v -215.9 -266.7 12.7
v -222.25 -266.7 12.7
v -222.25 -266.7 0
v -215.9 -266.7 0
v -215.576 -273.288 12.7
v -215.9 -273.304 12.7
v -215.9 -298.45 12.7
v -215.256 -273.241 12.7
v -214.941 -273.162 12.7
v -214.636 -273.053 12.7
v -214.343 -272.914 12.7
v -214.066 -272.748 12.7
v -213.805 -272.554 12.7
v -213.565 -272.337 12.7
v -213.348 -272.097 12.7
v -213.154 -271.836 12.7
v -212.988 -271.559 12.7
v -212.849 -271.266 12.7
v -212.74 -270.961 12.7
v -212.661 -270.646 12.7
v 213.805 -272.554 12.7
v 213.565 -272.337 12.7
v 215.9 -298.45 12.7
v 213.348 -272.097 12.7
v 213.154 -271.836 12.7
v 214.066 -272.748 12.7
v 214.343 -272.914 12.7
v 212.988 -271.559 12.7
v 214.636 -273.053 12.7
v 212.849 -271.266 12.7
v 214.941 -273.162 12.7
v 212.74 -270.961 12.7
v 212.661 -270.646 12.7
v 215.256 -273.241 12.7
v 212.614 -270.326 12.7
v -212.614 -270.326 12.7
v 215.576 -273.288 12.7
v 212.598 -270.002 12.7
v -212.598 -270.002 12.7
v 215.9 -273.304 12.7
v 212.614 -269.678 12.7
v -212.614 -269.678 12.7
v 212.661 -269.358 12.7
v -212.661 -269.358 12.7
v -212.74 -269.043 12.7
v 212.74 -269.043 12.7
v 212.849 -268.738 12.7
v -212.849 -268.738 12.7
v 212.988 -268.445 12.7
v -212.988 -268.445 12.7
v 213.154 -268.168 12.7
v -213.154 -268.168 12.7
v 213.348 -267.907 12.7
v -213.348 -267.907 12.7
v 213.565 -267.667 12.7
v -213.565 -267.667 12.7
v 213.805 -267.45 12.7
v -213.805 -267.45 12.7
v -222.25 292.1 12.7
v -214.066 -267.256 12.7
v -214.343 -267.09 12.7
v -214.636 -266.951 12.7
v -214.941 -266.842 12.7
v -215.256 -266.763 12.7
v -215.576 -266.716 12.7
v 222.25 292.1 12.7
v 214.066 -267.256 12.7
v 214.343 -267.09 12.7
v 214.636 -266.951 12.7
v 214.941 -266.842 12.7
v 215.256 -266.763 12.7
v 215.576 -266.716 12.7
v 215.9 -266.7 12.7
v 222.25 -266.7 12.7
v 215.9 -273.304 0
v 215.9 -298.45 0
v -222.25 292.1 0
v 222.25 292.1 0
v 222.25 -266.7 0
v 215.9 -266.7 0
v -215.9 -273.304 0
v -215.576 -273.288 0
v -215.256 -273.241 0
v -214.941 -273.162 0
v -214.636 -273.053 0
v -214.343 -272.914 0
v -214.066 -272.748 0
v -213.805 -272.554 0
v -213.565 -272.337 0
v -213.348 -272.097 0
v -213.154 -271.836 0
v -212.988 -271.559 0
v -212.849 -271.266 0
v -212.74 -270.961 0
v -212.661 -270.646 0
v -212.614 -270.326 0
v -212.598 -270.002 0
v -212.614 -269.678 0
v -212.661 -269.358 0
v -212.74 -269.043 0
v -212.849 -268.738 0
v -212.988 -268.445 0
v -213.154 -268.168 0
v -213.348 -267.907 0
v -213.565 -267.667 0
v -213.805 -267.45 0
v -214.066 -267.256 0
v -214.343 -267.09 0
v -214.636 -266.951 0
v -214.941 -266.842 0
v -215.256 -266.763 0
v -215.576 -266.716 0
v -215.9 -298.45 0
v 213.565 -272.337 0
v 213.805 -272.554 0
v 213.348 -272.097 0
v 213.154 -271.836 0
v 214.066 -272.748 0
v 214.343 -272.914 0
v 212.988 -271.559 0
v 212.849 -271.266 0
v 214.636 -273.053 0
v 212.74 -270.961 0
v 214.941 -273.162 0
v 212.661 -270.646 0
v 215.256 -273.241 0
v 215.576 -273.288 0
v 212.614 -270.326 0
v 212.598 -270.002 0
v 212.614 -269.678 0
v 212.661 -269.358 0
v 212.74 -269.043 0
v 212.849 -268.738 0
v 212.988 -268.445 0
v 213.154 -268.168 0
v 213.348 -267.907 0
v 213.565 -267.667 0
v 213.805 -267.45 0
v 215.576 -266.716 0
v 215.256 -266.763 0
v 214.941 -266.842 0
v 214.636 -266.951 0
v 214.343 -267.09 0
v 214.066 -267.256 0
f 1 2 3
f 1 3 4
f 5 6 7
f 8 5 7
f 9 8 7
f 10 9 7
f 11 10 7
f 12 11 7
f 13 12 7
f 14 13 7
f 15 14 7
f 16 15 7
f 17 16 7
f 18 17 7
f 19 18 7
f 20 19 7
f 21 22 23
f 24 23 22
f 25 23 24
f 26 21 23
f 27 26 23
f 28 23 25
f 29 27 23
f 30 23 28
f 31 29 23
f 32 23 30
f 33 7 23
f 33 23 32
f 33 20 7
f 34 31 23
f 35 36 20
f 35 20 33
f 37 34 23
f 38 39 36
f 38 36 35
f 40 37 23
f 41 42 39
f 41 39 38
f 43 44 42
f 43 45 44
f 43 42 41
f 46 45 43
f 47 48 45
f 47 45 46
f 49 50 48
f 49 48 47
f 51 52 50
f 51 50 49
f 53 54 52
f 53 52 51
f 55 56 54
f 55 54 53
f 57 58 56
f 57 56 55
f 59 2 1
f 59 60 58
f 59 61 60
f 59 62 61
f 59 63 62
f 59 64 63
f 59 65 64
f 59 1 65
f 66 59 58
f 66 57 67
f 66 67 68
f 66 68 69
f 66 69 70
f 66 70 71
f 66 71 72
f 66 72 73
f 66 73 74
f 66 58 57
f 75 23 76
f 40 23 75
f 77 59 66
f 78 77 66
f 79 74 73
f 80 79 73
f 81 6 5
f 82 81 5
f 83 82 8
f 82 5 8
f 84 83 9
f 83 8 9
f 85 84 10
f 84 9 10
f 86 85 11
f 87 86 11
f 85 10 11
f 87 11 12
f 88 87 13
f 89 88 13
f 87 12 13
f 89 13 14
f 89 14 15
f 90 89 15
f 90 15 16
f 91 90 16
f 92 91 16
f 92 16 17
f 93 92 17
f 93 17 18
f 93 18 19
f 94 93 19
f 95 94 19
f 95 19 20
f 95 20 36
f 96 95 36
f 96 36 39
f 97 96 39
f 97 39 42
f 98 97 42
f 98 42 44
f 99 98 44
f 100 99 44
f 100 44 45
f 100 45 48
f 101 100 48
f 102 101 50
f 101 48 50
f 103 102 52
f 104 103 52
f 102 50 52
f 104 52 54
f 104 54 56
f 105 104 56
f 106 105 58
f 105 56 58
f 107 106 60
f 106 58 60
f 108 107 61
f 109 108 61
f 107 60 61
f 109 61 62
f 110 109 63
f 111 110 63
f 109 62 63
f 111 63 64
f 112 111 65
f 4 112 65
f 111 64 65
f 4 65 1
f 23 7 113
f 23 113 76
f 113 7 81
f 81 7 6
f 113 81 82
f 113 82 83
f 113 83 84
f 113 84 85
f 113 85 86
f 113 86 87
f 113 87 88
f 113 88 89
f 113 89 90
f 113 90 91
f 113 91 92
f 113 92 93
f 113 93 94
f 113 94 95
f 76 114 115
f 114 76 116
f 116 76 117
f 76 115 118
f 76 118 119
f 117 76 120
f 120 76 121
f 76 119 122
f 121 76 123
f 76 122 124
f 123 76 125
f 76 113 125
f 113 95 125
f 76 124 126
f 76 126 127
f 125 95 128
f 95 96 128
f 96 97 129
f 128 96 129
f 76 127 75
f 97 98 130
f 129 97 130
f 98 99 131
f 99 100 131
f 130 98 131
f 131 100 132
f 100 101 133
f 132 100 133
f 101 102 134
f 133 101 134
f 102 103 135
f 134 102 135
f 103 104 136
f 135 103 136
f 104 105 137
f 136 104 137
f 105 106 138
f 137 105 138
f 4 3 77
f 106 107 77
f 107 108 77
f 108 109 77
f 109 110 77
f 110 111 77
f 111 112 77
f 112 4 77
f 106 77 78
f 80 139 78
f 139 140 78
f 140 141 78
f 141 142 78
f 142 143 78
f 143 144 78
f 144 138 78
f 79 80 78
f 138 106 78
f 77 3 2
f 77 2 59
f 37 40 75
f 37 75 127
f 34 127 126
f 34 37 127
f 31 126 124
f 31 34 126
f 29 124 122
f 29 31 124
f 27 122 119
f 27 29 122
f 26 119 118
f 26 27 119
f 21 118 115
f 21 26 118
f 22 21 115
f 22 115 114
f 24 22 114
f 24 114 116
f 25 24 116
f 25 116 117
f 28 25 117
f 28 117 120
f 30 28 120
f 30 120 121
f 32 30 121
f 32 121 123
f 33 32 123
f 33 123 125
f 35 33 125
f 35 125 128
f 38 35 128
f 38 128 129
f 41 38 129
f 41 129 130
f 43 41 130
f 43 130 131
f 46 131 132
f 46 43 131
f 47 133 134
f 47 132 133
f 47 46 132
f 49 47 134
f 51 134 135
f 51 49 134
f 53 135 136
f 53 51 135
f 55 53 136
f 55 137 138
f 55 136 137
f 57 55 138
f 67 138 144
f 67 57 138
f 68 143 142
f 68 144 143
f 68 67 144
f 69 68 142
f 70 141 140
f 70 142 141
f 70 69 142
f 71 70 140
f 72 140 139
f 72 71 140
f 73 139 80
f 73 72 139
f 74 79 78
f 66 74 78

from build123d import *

# Parameters (mm, degrees)
SKETCH1_W           = 444.5
SKETCH1_H           = 609.6
BOSS_EXTRUDE1_DEPTH = 12.7
CUT_EXTRUDE1_DEPTH  = 378.437931984
LPATTERN1_COUNT     = 8
LPATTERN1_PITCH     = 50.8
SKETCH3_R           = 3.302
SKETCH3_W           = 6.35
SKETCH3_H           = 38.1
CUT_EXTRUDE2_DEPTH  = 378.437931984
SKETCH4_W           = 444.5
SKETCH4_H           = 12.7
CUT_EXTRUDE3_DEPTH  = 378.437931984
SKETCH5_W           = 444.5
SKETCH5_H           = 18.431928634
BOSS_EXTRUDE2_DEPTH = 12.7
SKETCH7_W           = 444.5
SKETCH7_H           = 12.7
CUT_EXTRUDE5_DEPTH  = 6.35


with BuildPart() as part:
    # Sketch1 → Boss-Extrude1 (new body)
    with BuildSketch(Plane.XY):
        Rectangle(SKETCH1_W, SKETCH1_H)
    extrude(amount=BOSS_EXTRUDE1_DEPTH)

    # Sketch2 → Cut-Extrude1 (cut, through all)
    with BuildSketch(Plane.XY.offset(12.7)):
        with BuildLine():
            Line((-165.1, 304.8), (-190.5, 304.8))
            Line((-190.5, 304.8), (-190.5, 292.1))
            ThreePointArc((-190.5, 292.1), (-187.198, 295.402), (-183.896, 292.1))
            Line((-183.896, 292.1), (-171.704, 292.1))
            ThreePointArc((-171.704, 292.1), (-168.402, 295.402), (-165.1, 292.1))
            Line((-165.1, 292.1), (-165.1, 304.8))
        make_face()
        with BuildLine():
            ThreePointArc((-183.896, 292.1), (-187.198, 295.402), (-190.5, 292.1))
            Line((-190.5, 292.1), (-183.896, 292.1))
        make_face()
        with BuildLine():
            Line((-183.896, 292.1), (-190.5, 292.1))
            ThreePointArc((-190.5, 292.1), (-187.198, 288.798), (-183.896, 292.1))
        make_face()
        with BuildLine():
            ThreePointArc((-171.704, 292.1), (-168.402, 288.798), (-165.1, 292.1))
            Line((-165.1, 292.1), (-171.704, 292.1))
        make_face()
        with BuildLine():
            Line((-171.704, 292.1), (-165.1, 292.1))
            ThreePointArc((-165.1, 292.1), (-168.402, 295.402), (-171.704, 292.1))
        make_face()
    cut_extrude1 = extrude(amount=-CUT_EXTRUDE1_DEPTH, mode=Mode.SUBTRACT)

    # LPattern1: Cut-Extrude1 ×8
    with Locations(*[(i * LPATTERN1_PITCH, 0, 0) for i in range(1, LPATTERN1_COUNT)]):
        add(cut_extrude1, mode=Mode.SUBTRACT)

    # Sketch3 → Cut-Extrude2 (cut, through all)
    with BuildSketch(Plane.XY.offset(12.7)):
        with Locations((-215.9, -270.002)):
            Circle(SKETCH3_R)
        with Locations((-219.075, -285.75)):
            Rectangle(SKETCH3_W, SKETCH3_H)
    cut_extrude2 = extrude(amount=-CUT_EXTRUDE2_DEPTH, mode=Mode.SUBTRACT)

    # Mirror3: Cut-Extrude2 across plane
    add(cut_extrude2.mirror(Plane(origin=(0, 0, 0), x_dir=(0, 0, 1), z_dir=(1, 0, 0))), mode=Mode.SUBTRACT)

    # Sketch4 → Cut-Extrude3 (cut, through all)
    with BuildSketch(Plane.XY.offset(12.7)):
        with Locations((0, 298.45)):
            Rectangle(SKETCH4_W, SKETCH4_H)
    extrude(amount=-CUT_EXTRUDE3_DEPTH, mode=Mode.SUBTRACT)

    # Sketch5 → Boss-Extrude2 (add)
    with BuildSketch(Plane.XY.offset(12.7)):
        with Locations((0, 282.884035683)):
            Rectangle(SKETCH5_W, SKETCH5_H)
    extrude(amount=-BOSS_EXTRUDE2_DEPTH)

    # Sketch7 → Cut-Extrude5 (cut)
    with BuildSketch(Plane.XZ.offset(304.8)):
        with Locations((0, 6.35)):
            Rectangle(SKETCH7_W, SKETCH7_H)
    extrude(amount=-CUT_EXTRUDE5_DEPTH, mode=Mode.SUBTRACT)


solid = part.part
